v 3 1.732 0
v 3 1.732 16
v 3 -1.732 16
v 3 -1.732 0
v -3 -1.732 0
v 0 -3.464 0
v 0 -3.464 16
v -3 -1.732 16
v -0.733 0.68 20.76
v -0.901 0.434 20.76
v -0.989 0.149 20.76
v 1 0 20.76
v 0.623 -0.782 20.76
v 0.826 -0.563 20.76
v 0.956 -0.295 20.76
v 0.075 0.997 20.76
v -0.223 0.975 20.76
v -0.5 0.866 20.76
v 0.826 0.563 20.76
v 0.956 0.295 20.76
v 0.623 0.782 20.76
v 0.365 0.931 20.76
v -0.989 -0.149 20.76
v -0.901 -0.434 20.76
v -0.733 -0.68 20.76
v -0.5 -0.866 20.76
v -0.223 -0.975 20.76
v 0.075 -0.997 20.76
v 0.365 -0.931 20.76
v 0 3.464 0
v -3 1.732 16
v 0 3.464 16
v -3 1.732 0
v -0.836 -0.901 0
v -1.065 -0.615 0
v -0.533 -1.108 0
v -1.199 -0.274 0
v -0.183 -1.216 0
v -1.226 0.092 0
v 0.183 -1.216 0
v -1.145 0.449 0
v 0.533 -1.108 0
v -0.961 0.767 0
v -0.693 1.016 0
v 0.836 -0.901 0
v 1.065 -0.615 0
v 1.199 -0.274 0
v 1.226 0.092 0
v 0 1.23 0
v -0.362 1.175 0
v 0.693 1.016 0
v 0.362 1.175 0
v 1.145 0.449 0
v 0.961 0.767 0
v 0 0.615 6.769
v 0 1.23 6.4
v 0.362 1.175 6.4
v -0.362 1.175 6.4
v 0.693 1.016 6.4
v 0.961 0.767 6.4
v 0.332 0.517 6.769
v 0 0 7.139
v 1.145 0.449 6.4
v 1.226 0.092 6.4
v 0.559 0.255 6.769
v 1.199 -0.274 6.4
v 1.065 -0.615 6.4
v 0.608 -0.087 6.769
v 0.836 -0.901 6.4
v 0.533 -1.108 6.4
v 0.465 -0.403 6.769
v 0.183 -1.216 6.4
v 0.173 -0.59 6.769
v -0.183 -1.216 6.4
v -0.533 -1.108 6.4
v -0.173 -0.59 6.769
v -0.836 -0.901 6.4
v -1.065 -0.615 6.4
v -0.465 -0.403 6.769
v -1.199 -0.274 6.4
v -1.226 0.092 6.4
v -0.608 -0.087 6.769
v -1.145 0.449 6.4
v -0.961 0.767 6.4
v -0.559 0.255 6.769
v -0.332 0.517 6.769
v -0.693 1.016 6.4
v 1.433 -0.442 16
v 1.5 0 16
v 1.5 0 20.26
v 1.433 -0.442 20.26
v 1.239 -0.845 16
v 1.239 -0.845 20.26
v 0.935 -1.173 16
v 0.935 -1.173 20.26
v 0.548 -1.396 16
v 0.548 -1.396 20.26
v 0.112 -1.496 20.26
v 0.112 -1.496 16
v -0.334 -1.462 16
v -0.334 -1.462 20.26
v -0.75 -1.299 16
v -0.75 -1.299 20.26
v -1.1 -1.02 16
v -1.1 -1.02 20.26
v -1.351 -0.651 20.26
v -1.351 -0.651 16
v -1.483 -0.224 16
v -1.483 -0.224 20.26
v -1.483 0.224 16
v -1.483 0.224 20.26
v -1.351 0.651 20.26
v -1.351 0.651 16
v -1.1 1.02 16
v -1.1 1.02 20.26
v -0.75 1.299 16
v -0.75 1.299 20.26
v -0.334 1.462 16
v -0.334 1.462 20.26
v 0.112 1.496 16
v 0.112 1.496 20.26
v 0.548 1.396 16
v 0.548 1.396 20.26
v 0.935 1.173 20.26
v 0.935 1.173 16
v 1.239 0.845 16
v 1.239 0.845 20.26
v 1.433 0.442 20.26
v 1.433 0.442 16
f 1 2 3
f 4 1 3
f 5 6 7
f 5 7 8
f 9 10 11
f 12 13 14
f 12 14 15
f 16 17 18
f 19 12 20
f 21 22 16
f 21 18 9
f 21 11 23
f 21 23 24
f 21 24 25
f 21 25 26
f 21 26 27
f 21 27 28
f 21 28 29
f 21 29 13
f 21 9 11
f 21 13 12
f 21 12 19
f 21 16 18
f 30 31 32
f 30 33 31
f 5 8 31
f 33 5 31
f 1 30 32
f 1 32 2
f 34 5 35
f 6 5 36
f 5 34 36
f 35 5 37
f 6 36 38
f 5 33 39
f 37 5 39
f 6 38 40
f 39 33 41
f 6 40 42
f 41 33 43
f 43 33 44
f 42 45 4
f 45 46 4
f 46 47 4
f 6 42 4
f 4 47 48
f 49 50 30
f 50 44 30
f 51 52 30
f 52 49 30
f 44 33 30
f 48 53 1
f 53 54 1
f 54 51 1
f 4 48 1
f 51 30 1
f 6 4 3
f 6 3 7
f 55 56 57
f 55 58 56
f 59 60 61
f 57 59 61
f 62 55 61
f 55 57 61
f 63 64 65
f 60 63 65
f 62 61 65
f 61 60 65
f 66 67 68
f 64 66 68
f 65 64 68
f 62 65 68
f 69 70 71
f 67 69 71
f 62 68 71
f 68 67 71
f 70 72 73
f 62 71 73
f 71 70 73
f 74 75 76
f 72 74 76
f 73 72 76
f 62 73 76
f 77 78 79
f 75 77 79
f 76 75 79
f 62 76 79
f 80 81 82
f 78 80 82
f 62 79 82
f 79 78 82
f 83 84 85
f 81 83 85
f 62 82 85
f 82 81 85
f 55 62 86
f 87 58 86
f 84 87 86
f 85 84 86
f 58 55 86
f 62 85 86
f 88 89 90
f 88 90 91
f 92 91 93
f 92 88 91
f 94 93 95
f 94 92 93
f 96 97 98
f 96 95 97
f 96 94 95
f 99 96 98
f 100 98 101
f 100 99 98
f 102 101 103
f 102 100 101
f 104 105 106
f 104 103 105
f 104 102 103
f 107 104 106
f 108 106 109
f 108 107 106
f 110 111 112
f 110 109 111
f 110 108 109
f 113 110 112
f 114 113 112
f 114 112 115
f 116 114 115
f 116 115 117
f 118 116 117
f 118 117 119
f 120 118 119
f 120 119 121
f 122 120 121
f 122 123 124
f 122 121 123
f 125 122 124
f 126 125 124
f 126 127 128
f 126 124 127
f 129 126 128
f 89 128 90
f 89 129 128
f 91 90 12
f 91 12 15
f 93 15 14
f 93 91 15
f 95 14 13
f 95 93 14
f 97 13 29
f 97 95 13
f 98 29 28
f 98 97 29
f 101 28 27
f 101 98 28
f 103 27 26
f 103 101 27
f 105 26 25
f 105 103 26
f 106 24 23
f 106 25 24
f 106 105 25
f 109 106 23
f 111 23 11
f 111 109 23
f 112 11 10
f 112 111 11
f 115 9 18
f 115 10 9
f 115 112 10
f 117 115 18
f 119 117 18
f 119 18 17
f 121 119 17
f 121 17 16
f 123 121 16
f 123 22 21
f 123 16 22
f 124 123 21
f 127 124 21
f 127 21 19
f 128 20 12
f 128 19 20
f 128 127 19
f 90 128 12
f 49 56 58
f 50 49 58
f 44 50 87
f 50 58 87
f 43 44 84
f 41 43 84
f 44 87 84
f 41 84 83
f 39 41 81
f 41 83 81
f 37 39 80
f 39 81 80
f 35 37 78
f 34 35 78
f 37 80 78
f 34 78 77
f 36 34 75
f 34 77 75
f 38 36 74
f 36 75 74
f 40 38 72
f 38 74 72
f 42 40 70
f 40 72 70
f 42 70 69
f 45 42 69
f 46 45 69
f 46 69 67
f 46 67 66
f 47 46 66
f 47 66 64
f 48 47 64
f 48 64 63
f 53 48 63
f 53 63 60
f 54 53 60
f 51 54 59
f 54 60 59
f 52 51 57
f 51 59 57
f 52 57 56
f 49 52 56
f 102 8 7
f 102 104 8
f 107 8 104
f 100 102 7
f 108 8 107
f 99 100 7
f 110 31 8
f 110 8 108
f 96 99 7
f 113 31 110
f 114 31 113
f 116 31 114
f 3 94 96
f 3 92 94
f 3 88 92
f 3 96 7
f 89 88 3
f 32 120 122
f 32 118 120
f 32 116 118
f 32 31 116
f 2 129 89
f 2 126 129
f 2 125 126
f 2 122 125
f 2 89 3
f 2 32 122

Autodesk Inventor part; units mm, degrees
ref_plane "YZ Plane" through (0, 0, 0) normal (1, 0, 0) x (0, 1, 0)
ref_plane "XZ Plane" through (0, 0, 0) normal (0, 1, 0) x (-1, 0, 0)
ref_plane "XY Plane" through (0, 0, 0) normal (0, 0, 1) x (1, 0, 0)
sketch "Sketch1" plane through (0, 0, 0) normal (0, 0, 1) x (1, 0, 0)
  line L0 (0, 3.4641) -> (3, 1.7321)
  line L1 (3, 1.7321) -> (3, -1.7321)
  line L2 (3, -1.7321) -> (0, -3.4641)
  line L3 (0, -3.4641) -> (-3, -1.7321)
  line L4 (-3, -1.7321) -> (-3, 1.7321)
  line L5 (-3, 1.7321) -> (0, 3.4641)
  point P0 (0, 0)
  point P1 (0, 0)
  dimension "d0" = 6
extrude "Extrusion1" add sketch "Sketch1" along normal blind 16
sketch "Sketch2" plane through (0, 0, 16) normal (0, 0, 1) x (1, 0, 0)
  circle A0 centre (0, 0) radius 1.5
  dimension "d3" = 3
extrude "Extrusion2" add sketch "Sketch2" along normal blind 4.76
thread "Thread1" size "M3x0.5" class "6g" standard "ANSI Metric M Profile" full length
sketch "Sketch3" plane through (0, 0, 0) normal (0, 0, -1) x (-1, 0, 0)
  point P0 (0, 0)
hole "Hole1" at (0, 0, 0) direction (0, 0, 1) diameter 2.459 depth 6.4 tip angle 118 thread size "M3x0.5" class "6H" standard "ANSI Metric M Profile"
chamfer "Chamfer1" distance 0.5 angle 45 1 edges at (-1.5, 0, 20.76)
properties part number "3mm-standoff-16-long"
